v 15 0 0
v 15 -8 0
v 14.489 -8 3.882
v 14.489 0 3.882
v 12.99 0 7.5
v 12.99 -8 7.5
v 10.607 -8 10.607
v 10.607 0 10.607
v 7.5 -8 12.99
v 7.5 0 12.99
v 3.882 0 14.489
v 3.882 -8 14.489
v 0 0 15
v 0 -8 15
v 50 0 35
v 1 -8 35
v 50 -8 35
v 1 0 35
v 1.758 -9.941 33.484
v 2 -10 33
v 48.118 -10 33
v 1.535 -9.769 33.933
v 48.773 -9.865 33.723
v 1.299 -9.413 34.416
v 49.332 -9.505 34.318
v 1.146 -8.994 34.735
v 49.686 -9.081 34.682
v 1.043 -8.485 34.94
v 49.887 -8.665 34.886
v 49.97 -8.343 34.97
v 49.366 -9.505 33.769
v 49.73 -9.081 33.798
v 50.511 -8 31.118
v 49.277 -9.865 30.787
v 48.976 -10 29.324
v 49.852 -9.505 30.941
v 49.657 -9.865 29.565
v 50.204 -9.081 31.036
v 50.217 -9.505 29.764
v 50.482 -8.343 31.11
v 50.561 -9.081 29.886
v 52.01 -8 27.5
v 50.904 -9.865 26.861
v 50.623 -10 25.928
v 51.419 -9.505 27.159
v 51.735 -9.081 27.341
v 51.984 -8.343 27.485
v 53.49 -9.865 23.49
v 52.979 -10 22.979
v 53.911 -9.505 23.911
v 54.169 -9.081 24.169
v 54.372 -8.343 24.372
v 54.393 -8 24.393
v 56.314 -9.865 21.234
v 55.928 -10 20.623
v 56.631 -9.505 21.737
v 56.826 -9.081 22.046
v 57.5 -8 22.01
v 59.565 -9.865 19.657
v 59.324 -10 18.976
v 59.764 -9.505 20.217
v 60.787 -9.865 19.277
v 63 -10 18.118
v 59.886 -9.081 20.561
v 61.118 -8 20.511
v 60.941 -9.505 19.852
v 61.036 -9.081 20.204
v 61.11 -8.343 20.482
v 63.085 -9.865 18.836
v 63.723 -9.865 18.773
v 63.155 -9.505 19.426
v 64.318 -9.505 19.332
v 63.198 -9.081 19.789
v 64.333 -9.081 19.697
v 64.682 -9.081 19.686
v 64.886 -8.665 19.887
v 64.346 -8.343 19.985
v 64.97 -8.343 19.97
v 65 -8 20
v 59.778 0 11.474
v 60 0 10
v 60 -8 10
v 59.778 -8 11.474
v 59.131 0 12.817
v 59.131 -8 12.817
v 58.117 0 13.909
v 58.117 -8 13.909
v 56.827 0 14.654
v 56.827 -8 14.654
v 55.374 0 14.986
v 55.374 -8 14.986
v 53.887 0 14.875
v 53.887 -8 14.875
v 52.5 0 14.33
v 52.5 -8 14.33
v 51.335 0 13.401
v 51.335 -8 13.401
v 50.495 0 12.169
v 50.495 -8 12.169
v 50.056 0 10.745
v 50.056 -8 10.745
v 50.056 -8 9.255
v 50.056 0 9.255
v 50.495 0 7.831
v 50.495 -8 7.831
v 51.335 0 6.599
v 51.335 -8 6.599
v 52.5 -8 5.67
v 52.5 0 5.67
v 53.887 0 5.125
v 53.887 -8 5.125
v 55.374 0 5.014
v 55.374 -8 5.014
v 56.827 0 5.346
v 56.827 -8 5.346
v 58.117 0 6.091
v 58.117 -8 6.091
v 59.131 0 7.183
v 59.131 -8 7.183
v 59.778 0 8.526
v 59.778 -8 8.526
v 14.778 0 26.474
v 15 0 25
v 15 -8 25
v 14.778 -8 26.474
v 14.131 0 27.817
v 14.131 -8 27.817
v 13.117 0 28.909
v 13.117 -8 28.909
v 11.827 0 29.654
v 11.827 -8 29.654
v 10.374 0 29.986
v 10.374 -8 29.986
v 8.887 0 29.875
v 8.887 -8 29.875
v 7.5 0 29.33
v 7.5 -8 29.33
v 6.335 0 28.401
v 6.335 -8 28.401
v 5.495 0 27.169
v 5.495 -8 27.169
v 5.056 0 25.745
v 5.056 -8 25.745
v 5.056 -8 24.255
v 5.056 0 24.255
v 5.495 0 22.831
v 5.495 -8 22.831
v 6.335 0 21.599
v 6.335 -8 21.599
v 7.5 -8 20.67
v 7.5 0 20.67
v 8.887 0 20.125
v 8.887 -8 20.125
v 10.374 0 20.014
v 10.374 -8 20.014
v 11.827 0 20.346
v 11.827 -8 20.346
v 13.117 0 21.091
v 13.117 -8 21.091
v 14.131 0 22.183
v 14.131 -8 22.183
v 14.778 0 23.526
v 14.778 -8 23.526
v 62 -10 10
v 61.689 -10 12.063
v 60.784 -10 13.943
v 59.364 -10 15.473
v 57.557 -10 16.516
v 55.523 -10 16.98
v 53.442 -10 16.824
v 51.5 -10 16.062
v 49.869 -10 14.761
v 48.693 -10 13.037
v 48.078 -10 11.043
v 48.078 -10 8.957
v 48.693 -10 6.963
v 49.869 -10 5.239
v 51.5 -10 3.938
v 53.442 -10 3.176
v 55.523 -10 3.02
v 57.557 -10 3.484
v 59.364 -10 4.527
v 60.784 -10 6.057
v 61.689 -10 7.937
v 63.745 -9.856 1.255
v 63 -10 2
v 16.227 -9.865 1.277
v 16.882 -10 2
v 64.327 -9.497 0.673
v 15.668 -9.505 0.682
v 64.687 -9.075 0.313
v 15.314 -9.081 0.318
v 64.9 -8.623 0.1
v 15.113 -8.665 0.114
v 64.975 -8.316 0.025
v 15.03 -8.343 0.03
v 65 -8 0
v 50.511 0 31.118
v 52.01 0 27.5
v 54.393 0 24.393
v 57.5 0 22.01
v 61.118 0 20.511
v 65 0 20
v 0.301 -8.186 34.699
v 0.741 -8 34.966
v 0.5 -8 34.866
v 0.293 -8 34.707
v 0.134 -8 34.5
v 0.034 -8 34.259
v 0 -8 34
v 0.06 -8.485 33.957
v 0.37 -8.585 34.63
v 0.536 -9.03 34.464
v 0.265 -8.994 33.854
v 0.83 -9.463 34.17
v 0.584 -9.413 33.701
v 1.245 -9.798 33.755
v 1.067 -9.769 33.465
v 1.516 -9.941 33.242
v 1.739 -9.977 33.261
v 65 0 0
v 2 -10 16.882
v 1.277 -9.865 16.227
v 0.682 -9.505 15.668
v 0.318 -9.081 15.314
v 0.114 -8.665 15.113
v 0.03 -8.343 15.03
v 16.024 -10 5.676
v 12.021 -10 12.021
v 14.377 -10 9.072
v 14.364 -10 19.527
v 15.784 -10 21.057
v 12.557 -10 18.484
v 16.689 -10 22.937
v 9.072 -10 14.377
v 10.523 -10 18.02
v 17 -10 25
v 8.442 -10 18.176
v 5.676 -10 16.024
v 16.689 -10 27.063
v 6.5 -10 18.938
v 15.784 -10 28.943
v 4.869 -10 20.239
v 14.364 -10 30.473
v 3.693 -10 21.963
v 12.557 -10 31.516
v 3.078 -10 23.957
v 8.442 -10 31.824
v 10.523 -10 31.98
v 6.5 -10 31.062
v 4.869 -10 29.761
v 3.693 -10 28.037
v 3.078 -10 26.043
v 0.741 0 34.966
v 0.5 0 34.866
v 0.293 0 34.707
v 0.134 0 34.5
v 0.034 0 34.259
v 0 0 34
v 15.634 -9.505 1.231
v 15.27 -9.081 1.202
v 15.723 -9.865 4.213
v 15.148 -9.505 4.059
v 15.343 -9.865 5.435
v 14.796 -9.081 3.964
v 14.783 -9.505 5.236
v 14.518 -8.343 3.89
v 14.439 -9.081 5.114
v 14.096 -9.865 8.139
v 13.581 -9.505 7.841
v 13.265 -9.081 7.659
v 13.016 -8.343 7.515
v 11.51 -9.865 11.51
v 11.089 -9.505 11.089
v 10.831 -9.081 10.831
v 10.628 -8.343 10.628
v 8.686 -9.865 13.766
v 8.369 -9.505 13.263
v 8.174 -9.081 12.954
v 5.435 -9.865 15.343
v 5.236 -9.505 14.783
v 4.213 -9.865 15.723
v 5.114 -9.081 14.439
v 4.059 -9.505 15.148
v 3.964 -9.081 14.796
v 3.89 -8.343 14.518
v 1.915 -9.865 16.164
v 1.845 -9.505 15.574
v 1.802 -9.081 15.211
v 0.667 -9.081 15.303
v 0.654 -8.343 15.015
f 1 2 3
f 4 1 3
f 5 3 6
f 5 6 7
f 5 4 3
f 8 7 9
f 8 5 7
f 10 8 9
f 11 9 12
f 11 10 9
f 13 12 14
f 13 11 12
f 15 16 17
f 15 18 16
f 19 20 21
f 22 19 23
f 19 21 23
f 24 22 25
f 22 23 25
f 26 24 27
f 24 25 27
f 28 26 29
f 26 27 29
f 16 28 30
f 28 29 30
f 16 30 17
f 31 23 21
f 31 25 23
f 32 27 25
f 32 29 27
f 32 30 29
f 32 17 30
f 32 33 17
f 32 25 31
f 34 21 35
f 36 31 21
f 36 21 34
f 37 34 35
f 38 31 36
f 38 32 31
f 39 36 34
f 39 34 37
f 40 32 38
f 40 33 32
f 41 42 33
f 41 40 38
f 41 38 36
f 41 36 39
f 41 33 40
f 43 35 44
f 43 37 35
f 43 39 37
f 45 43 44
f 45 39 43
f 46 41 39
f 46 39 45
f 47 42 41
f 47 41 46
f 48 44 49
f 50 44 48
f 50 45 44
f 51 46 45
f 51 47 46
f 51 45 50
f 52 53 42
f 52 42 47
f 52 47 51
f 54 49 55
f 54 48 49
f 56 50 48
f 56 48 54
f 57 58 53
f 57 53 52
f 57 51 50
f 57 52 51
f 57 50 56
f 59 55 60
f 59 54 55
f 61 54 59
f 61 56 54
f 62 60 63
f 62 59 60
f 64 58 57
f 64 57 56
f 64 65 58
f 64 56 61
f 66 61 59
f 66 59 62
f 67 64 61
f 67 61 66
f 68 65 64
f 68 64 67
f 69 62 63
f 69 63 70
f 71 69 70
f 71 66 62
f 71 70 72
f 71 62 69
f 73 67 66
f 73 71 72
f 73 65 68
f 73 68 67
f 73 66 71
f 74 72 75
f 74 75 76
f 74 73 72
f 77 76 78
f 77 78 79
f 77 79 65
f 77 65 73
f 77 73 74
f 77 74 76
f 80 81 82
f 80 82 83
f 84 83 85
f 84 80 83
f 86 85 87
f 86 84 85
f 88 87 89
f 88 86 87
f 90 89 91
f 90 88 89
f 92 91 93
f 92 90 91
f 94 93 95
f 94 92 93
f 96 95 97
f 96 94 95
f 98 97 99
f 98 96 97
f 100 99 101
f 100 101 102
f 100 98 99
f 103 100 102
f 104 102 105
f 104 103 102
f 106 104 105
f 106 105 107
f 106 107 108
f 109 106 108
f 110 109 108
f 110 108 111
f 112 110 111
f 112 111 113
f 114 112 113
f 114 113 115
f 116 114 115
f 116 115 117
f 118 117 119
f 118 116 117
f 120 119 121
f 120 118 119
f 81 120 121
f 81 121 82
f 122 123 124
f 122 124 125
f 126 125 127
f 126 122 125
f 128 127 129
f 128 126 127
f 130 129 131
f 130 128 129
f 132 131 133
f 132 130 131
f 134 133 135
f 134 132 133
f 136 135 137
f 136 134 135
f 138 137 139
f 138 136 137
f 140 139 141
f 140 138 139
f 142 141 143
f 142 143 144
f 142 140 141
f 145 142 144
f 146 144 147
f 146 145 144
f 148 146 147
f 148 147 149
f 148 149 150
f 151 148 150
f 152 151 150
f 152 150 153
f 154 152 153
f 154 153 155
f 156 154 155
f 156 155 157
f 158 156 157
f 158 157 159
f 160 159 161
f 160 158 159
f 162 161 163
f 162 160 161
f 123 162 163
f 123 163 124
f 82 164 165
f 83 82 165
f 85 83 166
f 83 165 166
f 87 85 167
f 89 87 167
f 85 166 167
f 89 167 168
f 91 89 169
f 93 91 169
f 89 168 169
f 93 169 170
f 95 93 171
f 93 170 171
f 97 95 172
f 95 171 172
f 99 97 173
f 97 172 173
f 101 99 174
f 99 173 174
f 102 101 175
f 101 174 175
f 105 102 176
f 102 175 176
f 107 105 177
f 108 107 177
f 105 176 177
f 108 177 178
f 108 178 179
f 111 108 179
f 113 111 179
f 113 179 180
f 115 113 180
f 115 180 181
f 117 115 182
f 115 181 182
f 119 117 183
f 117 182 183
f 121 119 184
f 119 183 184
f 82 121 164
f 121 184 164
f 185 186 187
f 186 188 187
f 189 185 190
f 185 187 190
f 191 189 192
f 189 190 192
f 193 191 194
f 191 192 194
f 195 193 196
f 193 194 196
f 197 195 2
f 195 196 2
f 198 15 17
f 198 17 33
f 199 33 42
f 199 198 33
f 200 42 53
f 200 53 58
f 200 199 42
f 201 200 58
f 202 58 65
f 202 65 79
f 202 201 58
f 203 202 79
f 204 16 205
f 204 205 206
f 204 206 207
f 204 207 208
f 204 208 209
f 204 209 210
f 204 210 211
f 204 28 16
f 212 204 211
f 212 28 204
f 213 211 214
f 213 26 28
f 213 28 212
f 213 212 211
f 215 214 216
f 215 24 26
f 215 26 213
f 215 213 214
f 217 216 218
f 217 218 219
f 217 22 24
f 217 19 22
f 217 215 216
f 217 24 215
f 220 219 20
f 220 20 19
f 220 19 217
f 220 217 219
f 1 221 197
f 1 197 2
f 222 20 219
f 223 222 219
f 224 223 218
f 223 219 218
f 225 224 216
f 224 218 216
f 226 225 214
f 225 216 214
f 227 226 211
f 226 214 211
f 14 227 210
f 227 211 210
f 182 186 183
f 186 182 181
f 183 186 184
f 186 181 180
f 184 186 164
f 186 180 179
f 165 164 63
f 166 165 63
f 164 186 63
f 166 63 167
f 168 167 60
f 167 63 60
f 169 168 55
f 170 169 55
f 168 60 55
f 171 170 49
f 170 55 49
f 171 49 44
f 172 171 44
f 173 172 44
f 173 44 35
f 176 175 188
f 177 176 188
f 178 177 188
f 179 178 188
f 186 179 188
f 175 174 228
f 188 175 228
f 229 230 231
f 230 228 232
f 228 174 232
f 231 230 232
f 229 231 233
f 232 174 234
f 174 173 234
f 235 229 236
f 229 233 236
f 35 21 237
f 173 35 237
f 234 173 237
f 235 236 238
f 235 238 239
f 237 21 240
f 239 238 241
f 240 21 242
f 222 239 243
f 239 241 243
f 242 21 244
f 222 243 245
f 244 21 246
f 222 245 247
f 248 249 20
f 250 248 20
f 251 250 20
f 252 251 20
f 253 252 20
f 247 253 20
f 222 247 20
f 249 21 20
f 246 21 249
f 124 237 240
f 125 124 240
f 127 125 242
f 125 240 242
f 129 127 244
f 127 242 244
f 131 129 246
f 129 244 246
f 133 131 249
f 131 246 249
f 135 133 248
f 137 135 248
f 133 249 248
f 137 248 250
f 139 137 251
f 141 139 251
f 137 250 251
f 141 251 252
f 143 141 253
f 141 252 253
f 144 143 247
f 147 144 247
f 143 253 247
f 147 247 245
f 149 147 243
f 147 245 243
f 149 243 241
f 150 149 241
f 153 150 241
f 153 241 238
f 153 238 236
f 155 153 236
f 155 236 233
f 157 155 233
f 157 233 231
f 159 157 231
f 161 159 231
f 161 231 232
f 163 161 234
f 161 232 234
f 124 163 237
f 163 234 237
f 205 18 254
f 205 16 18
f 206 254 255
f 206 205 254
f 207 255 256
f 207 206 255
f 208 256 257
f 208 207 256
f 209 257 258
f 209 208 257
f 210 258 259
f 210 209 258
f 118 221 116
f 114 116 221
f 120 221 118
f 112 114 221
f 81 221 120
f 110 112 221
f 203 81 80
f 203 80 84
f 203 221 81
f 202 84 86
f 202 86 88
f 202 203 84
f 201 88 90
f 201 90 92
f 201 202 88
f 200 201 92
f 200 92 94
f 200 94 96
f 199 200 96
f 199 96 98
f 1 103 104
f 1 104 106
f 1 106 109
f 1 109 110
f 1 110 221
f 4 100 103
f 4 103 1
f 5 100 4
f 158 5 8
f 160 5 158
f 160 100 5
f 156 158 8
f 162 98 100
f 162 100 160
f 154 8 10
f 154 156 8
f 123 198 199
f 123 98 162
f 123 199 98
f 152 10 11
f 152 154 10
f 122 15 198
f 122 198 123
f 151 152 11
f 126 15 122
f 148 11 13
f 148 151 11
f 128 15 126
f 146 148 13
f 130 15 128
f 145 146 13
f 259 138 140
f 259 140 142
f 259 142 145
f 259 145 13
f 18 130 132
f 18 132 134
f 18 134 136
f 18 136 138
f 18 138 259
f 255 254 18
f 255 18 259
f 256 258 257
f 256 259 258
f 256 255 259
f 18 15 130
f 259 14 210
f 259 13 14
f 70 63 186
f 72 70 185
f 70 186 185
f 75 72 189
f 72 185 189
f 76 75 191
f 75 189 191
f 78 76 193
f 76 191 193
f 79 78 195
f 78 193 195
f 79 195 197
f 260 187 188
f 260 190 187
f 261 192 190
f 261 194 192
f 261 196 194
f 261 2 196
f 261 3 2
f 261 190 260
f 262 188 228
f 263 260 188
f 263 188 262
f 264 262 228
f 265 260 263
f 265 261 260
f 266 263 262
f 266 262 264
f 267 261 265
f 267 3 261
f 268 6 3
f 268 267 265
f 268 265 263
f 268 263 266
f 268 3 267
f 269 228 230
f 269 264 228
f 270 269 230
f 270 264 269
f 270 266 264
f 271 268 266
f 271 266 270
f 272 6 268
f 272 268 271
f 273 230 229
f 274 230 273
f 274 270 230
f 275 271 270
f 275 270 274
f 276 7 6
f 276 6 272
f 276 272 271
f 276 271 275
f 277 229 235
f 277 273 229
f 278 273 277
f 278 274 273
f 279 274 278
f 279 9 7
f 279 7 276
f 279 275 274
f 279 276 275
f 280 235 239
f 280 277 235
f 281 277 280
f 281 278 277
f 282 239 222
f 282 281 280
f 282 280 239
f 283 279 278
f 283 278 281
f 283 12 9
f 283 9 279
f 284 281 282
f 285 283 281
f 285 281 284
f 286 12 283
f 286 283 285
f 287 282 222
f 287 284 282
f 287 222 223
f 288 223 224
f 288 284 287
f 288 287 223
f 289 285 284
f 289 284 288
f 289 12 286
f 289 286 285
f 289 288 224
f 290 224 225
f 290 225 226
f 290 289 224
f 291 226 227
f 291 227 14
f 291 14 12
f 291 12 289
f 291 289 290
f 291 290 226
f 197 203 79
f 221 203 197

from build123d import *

# Parameters (mm, degrees)
SKETCH_R     = 5
PAD_DEPTH    = 10
CHAMFER_SIZE = 2
FILLET_R     = 2
FILLET001_R  = 1


with BuildPart() as part:
    # Sketch → Pad (new body)
    with BuildSketch(Plane.XZ):
        with BuildLine():
            Line((0, 35), (50, 35))
            ThreePointArc((50, 35), (54.393398, 24.393398), (65, 20))
            Line((65, 20), (65, 0))
            Line((65, 0), (15, 0))
            ThreePointArc((15, 0), (10.606602, 10.606602), (0, 15))
            Line((0, 15), (0, 35))
        make_face()
        with Locations((10, 25)):
            Circle(SKETCH_R, mode=Mode.SUBTRACT)
        with Locations((55, 10)):
            Circle(SKETCH_R, mode=Mode.SUBTRACT)
    extrude(amount=PAD_DEPTH)

    # Chamfer
    chamfer_edges = [part.edges().sort_by_distance(p)[0] for p in [
        (5, -10, 25),
        (50, -10, 10),
    ]]
    chamfer(chamfer_edges, length=CHAMFER_SIZE)

    # Fillet
    fillet_edges = [part.edges().sort_by_distance(p)[0] for p in [
        (65, -10, 10),
        (40, -10, 0),
        (0, -10, 25),
        (25, -10, 35),
        (54.393398, -10, 24.393398),
        (10.606602, -10, 10.606602),
    ]]
    fillet(fillet_edges, radius=FILLET_R)

    # Fillet001
    fillet001_edges = [part.edges().sort_by_distance(p)[0] for p in [
        (0, -4, 35),
    ]]
    fillet(fillet001_edges, radius=FILLET001_R)


solid = part.part
